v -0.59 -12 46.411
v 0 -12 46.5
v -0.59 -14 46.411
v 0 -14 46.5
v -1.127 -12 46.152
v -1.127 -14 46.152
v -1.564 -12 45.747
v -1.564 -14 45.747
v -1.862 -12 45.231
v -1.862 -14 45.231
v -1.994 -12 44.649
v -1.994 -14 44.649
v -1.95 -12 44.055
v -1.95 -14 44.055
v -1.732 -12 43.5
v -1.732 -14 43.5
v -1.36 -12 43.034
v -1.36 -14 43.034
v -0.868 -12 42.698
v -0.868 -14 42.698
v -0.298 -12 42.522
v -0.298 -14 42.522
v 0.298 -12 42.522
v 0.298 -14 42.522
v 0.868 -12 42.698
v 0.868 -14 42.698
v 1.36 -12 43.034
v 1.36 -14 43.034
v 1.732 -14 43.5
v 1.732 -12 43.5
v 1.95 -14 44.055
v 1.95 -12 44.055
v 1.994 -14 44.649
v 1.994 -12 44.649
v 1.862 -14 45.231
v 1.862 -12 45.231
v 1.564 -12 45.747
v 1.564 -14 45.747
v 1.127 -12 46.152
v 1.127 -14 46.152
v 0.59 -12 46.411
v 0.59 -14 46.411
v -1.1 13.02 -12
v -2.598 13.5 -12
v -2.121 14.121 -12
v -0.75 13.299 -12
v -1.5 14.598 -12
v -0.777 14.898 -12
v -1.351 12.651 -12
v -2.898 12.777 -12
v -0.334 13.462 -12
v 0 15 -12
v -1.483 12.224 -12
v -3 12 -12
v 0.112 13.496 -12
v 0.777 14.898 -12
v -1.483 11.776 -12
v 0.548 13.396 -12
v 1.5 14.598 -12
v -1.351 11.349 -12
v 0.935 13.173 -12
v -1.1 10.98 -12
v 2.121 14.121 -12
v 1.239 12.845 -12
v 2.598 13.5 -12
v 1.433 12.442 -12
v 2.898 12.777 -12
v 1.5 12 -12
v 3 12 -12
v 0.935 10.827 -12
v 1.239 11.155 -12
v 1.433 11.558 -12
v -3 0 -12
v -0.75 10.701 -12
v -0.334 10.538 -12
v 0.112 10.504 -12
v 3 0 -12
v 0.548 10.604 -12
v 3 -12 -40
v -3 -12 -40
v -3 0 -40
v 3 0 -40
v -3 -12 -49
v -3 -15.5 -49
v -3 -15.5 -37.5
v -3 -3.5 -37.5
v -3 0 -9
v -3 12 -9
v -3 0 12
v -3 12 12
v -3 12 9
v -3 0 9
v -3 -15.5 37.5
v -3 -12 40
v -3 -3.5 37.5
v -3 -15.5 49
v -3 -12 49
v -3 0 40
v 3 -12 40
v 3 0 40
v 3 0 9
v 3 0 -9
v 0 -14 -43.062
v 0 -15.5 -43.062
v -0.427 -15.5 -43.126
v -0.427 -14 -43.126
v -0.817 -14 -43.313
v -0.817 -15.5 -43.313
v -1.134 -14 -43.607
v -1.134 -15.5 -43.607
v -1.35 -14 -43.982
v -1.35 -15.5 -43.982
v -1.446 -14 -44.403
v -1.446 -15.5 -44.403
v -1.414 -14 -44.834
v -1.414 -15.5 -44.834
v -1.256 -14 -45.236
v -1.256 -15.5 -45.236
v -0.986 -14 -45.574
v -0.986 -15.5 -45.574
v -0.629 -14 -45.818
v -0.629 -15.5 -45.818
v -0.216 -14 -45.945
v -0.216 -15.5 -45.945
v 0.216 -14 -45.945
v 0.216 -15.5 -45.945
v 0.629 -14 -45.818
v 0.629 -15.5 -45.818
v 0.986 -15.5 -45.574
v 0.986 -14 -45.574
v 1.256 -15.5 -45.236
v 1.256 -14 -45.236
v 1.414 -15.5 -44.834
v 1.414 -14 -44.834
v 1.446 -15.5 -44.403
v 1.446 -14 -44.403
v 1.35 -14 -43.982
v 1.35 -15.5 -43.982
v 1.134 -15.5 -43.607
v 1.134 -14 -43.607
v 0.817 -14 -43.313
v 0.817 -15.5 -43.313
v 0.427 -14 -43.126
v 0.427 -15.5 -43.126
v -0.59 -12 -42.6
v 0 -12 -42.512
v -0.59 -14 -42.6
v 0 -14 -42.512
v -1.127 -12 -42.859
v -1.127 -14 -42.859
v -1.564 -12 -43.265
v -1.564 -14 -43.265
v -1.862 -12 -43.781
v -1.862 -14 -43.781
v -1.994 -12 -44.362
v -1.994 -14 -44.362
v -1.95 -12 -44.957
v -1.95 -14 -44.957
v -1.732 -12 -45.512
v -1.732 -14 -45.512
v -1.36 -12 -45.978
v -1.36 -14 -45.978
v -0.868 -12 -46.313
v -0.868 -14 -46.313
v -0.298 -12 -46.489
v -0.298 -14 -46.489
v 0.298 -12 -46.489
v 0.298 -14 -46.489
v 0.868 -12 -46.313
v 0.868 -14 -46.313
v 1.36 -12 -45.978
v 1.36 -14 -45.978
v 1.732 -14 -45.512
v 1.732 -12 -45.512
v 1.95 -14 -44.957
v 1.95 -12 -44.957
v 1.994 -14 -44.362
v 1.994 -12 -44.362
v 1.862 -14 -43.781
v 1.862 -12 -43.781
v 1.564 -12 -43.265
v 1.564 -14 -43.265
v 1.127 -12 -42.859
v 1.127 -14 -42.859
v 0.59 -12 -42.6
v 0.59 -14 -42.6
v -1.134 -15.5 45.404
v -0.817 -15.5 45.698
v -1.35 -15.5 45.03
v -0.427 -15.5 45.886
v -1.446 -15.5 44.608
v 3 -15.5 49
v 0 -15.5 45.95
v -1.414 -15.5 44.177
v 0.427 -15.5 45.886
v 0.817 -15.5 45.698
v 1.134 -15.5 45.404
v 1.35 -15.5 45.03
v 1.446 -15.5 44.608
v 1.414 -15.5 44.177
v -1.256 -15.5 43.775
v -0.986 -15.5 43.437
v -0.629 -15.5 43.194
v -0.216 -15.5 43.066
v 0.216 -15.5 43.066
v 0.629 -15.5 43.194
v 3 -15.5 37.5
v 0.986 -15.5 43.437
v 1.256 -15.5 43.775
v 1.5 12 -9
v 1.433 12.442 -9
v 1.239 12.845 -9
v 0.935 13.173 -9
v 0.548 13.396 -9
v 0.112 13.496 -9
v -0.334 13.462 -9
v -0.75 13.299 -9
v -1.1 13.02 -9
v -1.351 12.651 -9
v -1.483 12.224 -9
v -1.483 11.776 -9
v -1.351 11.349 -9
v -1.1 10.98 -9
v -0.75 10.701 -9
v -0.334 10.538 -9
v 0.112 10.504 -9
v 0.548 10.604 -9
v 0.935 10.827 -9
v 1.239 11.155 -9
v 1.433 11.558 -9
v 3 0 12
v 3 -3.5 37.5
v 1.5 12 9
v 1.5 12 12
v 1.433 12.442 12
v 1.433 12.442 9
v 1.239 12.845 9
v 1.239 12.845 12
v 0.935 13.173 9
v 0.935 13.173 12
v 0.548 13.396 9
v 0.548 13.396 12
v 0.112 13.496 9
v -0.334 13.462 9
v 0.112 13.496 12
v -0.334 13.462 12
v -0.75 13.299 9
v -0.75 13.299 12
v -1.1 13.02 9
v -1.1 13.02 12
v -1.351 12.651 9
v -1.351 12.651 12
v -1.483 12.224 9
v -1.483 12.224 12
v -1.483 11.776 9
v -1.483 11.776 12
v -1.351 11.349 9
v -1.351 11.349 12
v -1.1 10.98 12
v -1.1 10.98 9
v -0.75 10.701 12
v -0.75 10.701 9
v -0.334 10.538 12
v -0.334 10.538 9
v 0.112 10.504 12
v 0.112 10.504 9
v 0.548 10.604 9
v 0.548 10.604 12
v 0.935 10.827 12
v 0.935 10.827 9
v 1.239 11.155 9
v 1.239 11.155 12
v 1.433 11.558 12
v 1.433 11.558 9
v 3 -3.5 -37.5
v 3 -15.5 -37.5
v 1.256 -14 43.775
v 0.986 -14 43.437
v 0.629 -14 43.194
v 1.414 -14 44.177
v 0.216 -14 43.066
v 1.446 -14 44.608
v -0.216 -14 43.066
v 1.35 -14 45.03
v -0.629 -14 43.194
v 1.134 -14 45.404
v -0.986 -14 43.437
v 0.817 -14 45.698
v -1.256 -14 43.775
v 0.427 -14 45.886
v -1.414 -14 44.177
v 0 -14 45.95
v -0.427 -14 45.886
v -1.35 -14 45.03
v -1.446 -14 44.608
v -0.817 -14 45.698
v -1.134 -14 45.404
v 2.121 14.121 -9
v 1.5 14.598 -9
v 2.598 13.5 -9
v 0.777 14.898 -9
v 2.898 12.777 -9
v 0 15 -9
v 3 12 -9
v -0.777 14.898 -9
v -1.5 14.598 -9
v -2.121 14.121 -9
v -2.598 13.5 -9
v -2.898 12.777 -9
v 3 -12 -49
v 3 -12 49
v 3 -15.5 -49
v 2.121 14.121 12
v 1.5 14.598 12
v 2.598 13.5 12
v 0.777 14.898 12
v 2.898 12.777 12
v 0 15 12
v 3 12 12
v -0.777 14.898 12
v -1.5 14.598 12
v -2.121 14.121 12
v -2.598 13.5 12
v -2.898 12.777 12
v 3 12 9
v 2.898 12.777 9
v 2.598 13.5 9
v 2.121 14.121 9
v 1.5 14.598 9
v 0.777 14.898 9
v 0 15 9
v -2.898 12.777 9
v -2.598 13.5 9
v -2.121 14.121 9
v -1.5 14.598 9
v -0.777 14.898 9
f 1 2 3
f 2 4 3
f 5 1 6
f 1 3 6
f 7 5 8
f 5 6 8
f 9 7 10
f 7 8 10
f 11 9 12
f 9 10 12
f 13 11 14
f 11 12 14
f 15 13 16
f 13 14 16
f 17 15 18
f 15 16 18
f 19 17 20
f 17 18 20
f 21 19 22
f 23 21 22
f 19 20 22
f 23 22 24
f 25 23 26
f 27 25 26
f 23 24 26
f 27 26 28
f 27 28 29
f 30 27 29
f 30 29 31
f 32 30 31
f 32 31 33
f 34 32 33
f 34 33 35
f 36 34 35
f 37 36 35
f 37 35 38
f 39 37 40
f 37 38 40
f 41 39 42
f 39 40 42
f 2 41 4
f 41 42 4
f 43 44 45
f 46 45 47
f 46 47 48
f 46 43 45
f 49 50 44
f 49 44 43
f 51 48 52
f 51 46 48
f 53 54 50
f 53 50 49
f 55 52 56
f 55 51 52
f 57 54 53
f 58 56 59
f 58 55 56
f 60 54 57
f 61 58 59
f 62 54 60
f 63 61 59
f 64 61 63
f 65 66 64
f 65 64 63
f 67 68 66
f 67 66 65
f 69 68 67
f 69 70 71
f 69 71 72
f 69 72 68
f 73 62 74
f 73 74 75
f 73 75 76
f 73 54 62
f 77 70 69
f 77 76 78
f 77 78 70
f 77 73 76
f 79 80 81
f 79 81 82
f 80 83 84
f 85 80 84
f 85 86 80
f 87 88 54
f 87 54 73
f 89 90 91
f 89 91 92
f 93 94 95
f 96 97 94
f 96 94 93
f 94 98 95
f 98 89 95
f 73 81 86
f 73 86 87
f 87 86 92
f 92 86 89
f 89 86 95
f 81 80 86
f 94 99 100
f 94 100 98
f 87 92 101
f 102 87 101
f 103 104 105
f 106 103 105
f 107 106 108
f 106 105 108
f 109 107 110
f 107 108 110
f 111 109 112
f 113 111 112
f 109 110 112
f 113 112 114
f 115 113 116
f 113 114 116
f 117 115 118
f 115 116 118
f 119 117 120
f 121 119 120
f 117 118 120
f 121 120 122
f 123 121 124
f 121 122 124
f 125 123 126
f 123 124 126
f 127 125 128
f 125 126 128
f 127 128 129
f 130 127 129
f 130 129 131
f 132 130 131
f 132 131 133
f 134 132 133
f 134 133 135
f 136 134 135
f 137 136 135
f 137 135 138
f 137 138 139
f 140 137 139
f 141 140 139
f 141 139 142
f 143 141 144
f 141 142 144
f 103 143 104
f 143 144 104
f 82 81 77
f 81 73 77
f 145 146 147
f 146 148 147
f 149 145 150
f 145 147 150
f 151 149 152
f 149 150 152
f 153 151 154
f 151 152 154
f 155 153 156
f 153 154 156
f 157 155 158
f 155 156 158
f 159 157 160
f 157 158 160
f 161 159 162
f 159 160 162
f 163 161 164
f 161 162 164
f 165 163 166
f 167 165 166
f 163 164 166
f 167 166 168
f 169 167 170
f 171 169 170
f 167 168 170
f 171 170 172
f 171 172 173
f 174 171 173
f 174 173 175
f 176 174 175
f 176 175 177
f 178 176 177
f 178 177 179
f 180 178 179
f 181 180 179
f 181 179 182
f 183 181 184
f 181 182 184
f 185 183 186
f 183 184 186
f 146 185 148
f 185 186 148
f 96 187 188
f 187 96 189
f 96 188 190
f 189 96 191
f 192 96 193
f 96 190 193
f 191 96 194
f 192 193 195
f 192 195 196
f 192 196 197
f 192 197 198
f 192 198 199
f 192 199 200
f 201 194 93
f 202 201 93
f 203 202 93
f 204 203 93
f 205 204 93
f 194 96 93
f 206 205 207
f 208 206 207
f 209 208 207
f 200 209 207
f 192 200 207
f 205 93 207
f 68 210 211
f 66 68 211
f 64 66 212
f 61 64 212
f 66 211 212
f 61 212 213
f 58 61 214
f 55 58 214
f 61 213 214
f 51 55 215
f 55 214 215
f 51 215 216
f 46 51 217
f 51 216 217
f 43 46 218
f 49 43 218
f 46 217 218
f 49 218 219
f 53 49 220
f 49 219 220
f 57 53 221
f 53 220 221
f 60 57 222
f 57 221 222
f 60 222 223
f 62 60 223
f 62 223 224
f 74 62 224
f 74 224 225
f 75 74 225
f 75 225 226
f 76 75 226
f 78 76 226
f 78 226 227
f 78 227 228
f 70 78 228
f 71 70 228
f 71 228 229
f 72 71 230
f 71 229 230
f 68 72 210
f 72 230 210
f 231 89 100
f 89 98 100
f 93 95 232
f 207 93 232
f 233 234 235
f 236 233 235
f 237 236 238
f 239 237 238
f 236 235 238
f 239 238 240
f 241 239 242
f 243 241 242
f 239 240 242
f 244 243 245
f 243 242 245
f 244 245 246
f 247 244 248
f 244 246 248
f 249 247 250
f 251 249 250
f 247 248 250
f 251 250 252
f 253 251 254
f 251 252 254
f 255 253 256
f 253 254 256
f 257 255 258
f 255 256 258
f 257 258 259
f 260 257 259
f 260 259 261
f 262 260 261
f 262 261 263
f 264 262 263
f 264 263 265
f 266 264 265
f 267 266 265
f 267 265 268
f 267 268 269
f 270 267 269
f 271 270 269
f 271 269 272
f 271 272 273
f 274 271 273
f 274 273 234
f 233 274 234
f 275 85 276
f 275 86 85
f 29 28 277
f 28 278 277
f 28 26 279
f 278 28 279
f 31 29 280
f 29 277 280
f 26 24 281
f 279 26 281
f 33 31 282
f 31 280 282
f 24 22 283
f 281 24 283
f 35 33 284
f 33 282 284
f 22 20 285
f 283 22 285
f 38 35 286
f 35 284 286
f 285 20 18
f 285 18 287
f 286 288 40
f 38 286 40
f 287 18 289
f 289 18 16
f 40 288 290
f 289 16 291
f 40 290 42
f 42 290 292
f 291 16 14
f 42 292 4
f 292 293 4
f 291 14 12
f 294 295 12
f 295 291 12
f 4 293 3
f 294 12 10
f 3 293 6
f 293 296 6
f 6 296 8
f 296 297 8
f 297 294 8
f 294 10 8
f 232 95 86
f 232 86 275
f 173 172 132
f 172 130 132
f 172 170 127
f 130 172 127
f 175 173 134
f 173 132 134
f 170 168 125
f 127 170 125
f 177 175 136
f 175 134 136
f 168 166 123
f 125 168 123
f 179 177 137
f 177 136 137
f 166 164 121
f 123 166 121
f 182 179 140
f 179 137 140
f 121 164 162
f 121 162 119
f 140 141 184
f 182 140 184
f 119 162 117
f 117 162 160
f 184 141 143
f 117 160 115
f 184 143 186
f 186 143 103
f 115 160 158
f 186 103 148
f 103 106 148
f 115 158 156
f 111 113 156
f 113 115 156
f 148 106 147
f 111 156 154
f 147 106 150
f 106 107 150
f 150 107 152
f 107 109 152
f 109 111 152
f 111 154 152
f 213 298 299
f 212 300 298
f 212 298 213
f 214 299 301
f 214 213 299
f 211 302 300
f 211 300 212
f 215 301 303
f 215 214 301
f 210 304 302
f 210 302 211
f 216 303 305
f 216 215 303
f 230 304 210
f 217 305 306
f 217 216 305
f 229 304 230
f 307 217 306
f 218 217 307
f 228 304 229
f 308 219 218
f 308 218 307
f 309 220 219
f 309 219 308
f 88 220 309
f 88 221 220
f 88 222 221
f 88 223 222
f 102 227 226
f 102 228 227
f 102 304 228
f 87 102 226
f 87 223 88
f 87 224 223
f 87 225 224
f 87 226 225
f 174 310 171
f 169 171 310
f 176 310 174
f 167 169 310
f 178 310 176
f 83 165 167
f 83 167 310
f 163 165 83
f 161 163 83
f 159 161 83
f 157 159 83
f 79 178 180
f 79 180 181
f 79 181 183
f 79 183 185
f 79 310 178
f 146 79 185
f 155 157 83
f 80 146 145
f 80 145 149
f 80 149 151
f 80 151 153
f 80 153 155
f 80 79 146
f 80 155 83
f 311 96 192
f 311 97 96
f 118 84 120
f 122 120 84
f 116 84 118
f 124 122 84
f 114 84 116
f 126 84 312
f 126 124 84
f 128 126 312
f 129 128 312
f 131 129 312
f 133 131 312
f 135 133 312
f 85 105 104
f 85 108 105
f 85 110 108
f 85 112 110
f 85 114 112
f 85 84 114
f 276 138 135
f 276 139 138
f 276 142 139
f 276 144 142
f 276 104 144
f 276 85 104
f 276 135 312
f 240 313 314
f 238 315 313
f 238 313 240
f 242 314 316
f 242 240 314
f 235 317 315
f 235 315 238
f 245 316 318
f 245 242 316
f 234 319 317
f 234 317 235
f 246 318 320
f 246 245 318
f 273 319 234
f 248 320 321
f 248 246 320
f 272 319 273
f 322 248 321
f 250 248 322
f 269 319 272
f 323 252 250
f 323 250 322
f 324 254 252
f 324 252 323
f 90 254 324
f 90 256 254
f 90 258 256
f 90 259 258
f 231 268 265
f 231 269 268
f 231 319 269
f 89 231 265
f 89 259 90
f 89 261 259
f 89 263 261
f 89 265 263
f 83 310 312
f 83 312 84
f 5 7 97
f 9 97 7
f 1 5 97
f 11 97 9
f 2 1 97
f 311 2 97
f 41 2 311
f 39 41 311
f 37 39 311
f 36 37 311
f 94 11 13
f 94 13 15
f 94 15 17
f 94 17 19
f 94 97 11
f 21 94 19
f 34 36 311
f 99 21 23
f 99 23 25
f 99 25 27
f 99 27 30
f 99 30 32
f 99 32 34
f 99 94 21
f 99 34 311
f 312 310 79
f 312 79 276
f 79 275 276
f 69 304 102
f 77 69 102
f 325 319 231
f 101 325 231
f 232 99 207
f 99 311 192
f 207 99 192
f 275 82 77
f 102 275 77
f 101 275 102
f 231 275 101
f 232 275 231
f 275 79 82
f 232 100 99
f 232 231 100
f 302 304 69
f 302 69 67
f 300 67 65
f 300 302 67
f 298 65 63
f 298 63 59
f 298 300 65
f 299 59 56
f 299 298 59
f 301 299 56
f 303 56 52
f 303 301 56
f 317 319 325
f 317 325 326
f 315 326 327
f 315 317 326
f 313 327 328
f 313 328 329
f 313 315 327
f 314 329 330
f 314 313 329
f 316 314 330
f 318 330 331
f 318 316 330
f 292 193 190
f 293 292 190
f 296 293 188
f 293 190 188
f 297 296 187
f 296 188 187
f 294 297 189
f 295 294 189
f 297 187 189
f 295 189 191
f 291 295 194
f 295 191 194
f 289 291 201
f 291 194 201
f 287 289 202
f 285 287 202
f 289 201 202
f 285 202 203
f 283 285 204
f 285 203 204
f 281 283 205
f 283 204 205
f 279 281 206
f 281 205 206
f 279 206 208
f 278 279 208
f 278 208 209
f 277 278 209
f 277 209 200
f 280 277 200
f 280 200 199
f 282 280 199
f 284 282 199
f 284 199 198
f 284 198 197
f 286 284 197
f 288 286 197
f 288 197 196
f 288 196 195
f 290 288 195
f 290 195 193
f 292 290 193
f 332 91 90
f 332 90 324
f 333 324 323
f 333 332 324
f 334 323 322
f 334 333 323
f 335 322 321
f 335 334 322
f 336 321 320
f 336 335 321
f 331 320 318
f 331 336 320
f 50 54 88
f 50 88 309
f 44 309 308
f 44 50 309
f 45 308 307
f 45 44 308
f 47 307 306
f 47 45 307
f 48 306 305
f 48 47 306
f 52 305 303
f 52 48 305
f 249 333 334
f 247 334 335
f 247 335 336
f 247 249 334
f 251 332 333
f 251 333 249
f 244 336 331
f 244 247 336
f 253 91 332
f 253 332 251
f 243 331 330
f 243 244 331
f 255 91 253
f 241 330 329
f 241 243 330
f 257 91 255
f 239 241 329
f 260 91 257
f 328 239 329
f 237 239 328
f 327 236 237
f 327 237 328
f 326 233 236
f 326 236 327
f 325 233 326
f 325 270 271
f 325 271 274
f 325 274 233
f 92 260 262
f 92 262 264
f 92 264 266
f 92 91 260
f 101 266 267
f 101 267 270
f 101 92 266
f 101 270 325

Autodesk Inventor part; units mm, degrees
ref_plane "YZ Plane" through (0, 0, 0) normal (1, 0, 0) x (0, 1, 0)
ref_plane "XZ Plane" through (0, 0, 0) normal (0, 1, 0) x (-1, 0, 0)
ref_plane "XY Plane" through (0, 0, 0) normal (0, 0, 1) x (1, 0, 0)
sketch "Boceto1" plane through (0, 0, 0) normal (0, 1, 0) x (-1, 0, 0)
  line L0 (0, 12) -> (-3, 12)
  line L1 (-3, 12) -> (0, 12)
  line L2 (0, 12) -> (3, 12)
  line L3 (3, 12) -> (3, 9)
  line L4 (3, 9) -> (-3, 9)
  line L5 (-3, 9) -> (-3, 12)
  line L6 (0, -12) -> (-3, -12)
  line L7 (-3, -12) -> (-3, -9)
  line L8 (-3, -9) -> (3, -9)
  line L9 (3, -9) -> (3, -12)
  line L10 (3, -12) -> (-3, -12)
  point P0 (0, 0)
extrude "Extrusión1" add sketch "Boceto1" along normal blind 15
fillet "Empalme1" radius 3 4 edges at (3, 15, 10.5) (-3, 15, 10.5) (3, 15, -10.5) (-3, 15, -10.5)
sketch "Boceto2" plane through (0, 0, 0) normal (0, -1, 0) x (1, 0, 0)
  line L0 (-3, 9) -> (-3, 12) projected
  line L1 (3, -9) -> (3, -12) projected
  line L2 (-3, 12) -> (3, 12)
  line L3 (3, 12) -> (3, -12)
  line L4 (3, -12) -> (-3, -12)
  line L5 (-3, -12) -> (-3, 12)
  line L6 (3, 0) -> (3, -37.5)
  line L7 (3, 0) -> (3, 37.5)
  line L8 (3, 37.5) -> (-3, 37.5)
  line L9 (-3, 37.5) -> (-3, -37.5)
  line L10 (-3, -37.5) -> (3, -37.5)
  point P0 (0, 0)
  dimension "d11" = 37.5
  dimension "d12" = 37.5
extrude "Extrusión2" add sketch "Boceto2" along normal blind 3.5
sketch "Boceto3" plane through (0, -3.5, 0) normal (0, -1, 0) x (1, 0, 0)
  line L0 (-3, 37.5) -> (-3, -37.5) projected
  line L1 (3, -37.5) -> (3, 37.5) projected
  line L2 (-3, 37.5) -> (3, 37.5)
  line L3 (3, 37.5) -> (3, 40)
  line L4 (3, 40) -> (-3, 40)
  line L5 (-3, 40) -> (-3, 37.5)
  line L6 (-3, -37.5) -> (3, -37.5)
  line L7 (3, -37.5) -> (3, -40)
  line L8 (3, -40) -> (-3, -40)
  line L9 (-3, -40) -> (-3, -37.5)
  point P0 (0, 0)
  dimension "d15" = 2.5
  dimension "d16" = 2.5
extrude "Extrusión3" add sketch "Boceto3" along normal blind 12 contours L5 L4 L3 L2 | L6 L7 L8 L9
sketch "Boceto4" plane through (0, -3.5, 0) normal (0, 1, 0) x (1, 0, 0)
  line L0 (3, -40) -> (-3, -40) projected
  line L1 (3, 37.5) -> (3, -37.5) projected
  line L2 (-3, -40) -> (3, -40)
  line L3 (3, -40) -> (3, -37.5)
  line L4 (3, -37.5) -> (-3, -37.5)
  line L5 (-3, -37.5) -> (-3, -40)
  line L6 (-3, -37.5) -> (-3, 37.5) projected
  line L7 (-3, 40) -> (3, 40) projected
  line L8 (-3, 37.5) -> (3, 37.5)
  line L9 (3, 37.5) -> (3, 40)
  line L10 (3, 40) -> (-3, 40)
  line L11 (-3, 40) -> (-3, 37.5)
  point P0 (0, 0)
extrude "Extrusión4" add sketch "Boceto4" along normal blind 3.5 contours L0 L5 L4 L3 | L8 L11 L7 L9
sketch "Boceto5" plane through (-3, -15.5, 40) normal (0, 0, 1) x (1, 0, 0)
  line L0 (0, 0) -> (6, 0) projected
  line L1 (0, 15.5) -> (0, 0) projected
  line L2 (6, 0) -> (0, 0)
  line L3 (0, 0) -> (0, 3.5)
  line L4 (0, 3.5) -> (6, 3.5)
  line L5 (6, 3.5) -> (6, 0)
  point P0 (3, 15.5)
  dimension "d21" = 3.5
extrude "Extrusión5" add sketch "Boceto5" along normal blind 9
sketch "Boceto6" plane through (3, -15.5, -40) normal (0, 0, -1) x (-1, 0, 0)
  line L0 (6, 0) -> (0, 0) projected
  line L1 (0, 12) -> (0, 0) projected
  line L2 (6, 0) -> (0, 0)
  line L3 (0, 0) -> (0, 3.5)
  line L4 (0, 3.5) -> (6, 3.5)
  line L5 (6, 3.5) -> (6, 0)
  point P0 (3, 15.5)
  dimension "d24" = 3.5
extrude "Extrusión6" add sketch "Boceto6" along normal blind 9
sketch "Boceto7" plane through (0, 12, 12) normal (0, 0, 1) x (1, 0, 0)
  circle A0 centre (0, 0) radius 1.5
  point P0 (0, -12)
  dimension "d27" = 3
extrude "Extrusión7" cut sketch "Boceto7" against normal blind 31.25
sketch "Boceto8" plane through (-3, -12, 40) normal (0, 1, 0) x (1, 0, 0)
  line L0 (0, -9) -> (6, -9) projected
  line L1 (3, -9) -> (3, 0)
  line L2 (0, 0) -> (6, 0) projected
  line L3 (3, -4.5) -> (4.913, -4.5)
  line L4 (6, 80) -> (0, 80) projected
  line L5 (3, 80) -> (3, 89.023)
  line L6 (3, 84.5115) -> (4.913, 84.5115)
  point P0 (3, 40)
hole "Agujero1" at (0, -12, -44.5115) at (0, -12, 44.5) direction (0, -1, 0) diameter 2.9 depth 10 counterbore diameter 4 counterbore depth 2
properties part number "ventilador emergència inferior"
